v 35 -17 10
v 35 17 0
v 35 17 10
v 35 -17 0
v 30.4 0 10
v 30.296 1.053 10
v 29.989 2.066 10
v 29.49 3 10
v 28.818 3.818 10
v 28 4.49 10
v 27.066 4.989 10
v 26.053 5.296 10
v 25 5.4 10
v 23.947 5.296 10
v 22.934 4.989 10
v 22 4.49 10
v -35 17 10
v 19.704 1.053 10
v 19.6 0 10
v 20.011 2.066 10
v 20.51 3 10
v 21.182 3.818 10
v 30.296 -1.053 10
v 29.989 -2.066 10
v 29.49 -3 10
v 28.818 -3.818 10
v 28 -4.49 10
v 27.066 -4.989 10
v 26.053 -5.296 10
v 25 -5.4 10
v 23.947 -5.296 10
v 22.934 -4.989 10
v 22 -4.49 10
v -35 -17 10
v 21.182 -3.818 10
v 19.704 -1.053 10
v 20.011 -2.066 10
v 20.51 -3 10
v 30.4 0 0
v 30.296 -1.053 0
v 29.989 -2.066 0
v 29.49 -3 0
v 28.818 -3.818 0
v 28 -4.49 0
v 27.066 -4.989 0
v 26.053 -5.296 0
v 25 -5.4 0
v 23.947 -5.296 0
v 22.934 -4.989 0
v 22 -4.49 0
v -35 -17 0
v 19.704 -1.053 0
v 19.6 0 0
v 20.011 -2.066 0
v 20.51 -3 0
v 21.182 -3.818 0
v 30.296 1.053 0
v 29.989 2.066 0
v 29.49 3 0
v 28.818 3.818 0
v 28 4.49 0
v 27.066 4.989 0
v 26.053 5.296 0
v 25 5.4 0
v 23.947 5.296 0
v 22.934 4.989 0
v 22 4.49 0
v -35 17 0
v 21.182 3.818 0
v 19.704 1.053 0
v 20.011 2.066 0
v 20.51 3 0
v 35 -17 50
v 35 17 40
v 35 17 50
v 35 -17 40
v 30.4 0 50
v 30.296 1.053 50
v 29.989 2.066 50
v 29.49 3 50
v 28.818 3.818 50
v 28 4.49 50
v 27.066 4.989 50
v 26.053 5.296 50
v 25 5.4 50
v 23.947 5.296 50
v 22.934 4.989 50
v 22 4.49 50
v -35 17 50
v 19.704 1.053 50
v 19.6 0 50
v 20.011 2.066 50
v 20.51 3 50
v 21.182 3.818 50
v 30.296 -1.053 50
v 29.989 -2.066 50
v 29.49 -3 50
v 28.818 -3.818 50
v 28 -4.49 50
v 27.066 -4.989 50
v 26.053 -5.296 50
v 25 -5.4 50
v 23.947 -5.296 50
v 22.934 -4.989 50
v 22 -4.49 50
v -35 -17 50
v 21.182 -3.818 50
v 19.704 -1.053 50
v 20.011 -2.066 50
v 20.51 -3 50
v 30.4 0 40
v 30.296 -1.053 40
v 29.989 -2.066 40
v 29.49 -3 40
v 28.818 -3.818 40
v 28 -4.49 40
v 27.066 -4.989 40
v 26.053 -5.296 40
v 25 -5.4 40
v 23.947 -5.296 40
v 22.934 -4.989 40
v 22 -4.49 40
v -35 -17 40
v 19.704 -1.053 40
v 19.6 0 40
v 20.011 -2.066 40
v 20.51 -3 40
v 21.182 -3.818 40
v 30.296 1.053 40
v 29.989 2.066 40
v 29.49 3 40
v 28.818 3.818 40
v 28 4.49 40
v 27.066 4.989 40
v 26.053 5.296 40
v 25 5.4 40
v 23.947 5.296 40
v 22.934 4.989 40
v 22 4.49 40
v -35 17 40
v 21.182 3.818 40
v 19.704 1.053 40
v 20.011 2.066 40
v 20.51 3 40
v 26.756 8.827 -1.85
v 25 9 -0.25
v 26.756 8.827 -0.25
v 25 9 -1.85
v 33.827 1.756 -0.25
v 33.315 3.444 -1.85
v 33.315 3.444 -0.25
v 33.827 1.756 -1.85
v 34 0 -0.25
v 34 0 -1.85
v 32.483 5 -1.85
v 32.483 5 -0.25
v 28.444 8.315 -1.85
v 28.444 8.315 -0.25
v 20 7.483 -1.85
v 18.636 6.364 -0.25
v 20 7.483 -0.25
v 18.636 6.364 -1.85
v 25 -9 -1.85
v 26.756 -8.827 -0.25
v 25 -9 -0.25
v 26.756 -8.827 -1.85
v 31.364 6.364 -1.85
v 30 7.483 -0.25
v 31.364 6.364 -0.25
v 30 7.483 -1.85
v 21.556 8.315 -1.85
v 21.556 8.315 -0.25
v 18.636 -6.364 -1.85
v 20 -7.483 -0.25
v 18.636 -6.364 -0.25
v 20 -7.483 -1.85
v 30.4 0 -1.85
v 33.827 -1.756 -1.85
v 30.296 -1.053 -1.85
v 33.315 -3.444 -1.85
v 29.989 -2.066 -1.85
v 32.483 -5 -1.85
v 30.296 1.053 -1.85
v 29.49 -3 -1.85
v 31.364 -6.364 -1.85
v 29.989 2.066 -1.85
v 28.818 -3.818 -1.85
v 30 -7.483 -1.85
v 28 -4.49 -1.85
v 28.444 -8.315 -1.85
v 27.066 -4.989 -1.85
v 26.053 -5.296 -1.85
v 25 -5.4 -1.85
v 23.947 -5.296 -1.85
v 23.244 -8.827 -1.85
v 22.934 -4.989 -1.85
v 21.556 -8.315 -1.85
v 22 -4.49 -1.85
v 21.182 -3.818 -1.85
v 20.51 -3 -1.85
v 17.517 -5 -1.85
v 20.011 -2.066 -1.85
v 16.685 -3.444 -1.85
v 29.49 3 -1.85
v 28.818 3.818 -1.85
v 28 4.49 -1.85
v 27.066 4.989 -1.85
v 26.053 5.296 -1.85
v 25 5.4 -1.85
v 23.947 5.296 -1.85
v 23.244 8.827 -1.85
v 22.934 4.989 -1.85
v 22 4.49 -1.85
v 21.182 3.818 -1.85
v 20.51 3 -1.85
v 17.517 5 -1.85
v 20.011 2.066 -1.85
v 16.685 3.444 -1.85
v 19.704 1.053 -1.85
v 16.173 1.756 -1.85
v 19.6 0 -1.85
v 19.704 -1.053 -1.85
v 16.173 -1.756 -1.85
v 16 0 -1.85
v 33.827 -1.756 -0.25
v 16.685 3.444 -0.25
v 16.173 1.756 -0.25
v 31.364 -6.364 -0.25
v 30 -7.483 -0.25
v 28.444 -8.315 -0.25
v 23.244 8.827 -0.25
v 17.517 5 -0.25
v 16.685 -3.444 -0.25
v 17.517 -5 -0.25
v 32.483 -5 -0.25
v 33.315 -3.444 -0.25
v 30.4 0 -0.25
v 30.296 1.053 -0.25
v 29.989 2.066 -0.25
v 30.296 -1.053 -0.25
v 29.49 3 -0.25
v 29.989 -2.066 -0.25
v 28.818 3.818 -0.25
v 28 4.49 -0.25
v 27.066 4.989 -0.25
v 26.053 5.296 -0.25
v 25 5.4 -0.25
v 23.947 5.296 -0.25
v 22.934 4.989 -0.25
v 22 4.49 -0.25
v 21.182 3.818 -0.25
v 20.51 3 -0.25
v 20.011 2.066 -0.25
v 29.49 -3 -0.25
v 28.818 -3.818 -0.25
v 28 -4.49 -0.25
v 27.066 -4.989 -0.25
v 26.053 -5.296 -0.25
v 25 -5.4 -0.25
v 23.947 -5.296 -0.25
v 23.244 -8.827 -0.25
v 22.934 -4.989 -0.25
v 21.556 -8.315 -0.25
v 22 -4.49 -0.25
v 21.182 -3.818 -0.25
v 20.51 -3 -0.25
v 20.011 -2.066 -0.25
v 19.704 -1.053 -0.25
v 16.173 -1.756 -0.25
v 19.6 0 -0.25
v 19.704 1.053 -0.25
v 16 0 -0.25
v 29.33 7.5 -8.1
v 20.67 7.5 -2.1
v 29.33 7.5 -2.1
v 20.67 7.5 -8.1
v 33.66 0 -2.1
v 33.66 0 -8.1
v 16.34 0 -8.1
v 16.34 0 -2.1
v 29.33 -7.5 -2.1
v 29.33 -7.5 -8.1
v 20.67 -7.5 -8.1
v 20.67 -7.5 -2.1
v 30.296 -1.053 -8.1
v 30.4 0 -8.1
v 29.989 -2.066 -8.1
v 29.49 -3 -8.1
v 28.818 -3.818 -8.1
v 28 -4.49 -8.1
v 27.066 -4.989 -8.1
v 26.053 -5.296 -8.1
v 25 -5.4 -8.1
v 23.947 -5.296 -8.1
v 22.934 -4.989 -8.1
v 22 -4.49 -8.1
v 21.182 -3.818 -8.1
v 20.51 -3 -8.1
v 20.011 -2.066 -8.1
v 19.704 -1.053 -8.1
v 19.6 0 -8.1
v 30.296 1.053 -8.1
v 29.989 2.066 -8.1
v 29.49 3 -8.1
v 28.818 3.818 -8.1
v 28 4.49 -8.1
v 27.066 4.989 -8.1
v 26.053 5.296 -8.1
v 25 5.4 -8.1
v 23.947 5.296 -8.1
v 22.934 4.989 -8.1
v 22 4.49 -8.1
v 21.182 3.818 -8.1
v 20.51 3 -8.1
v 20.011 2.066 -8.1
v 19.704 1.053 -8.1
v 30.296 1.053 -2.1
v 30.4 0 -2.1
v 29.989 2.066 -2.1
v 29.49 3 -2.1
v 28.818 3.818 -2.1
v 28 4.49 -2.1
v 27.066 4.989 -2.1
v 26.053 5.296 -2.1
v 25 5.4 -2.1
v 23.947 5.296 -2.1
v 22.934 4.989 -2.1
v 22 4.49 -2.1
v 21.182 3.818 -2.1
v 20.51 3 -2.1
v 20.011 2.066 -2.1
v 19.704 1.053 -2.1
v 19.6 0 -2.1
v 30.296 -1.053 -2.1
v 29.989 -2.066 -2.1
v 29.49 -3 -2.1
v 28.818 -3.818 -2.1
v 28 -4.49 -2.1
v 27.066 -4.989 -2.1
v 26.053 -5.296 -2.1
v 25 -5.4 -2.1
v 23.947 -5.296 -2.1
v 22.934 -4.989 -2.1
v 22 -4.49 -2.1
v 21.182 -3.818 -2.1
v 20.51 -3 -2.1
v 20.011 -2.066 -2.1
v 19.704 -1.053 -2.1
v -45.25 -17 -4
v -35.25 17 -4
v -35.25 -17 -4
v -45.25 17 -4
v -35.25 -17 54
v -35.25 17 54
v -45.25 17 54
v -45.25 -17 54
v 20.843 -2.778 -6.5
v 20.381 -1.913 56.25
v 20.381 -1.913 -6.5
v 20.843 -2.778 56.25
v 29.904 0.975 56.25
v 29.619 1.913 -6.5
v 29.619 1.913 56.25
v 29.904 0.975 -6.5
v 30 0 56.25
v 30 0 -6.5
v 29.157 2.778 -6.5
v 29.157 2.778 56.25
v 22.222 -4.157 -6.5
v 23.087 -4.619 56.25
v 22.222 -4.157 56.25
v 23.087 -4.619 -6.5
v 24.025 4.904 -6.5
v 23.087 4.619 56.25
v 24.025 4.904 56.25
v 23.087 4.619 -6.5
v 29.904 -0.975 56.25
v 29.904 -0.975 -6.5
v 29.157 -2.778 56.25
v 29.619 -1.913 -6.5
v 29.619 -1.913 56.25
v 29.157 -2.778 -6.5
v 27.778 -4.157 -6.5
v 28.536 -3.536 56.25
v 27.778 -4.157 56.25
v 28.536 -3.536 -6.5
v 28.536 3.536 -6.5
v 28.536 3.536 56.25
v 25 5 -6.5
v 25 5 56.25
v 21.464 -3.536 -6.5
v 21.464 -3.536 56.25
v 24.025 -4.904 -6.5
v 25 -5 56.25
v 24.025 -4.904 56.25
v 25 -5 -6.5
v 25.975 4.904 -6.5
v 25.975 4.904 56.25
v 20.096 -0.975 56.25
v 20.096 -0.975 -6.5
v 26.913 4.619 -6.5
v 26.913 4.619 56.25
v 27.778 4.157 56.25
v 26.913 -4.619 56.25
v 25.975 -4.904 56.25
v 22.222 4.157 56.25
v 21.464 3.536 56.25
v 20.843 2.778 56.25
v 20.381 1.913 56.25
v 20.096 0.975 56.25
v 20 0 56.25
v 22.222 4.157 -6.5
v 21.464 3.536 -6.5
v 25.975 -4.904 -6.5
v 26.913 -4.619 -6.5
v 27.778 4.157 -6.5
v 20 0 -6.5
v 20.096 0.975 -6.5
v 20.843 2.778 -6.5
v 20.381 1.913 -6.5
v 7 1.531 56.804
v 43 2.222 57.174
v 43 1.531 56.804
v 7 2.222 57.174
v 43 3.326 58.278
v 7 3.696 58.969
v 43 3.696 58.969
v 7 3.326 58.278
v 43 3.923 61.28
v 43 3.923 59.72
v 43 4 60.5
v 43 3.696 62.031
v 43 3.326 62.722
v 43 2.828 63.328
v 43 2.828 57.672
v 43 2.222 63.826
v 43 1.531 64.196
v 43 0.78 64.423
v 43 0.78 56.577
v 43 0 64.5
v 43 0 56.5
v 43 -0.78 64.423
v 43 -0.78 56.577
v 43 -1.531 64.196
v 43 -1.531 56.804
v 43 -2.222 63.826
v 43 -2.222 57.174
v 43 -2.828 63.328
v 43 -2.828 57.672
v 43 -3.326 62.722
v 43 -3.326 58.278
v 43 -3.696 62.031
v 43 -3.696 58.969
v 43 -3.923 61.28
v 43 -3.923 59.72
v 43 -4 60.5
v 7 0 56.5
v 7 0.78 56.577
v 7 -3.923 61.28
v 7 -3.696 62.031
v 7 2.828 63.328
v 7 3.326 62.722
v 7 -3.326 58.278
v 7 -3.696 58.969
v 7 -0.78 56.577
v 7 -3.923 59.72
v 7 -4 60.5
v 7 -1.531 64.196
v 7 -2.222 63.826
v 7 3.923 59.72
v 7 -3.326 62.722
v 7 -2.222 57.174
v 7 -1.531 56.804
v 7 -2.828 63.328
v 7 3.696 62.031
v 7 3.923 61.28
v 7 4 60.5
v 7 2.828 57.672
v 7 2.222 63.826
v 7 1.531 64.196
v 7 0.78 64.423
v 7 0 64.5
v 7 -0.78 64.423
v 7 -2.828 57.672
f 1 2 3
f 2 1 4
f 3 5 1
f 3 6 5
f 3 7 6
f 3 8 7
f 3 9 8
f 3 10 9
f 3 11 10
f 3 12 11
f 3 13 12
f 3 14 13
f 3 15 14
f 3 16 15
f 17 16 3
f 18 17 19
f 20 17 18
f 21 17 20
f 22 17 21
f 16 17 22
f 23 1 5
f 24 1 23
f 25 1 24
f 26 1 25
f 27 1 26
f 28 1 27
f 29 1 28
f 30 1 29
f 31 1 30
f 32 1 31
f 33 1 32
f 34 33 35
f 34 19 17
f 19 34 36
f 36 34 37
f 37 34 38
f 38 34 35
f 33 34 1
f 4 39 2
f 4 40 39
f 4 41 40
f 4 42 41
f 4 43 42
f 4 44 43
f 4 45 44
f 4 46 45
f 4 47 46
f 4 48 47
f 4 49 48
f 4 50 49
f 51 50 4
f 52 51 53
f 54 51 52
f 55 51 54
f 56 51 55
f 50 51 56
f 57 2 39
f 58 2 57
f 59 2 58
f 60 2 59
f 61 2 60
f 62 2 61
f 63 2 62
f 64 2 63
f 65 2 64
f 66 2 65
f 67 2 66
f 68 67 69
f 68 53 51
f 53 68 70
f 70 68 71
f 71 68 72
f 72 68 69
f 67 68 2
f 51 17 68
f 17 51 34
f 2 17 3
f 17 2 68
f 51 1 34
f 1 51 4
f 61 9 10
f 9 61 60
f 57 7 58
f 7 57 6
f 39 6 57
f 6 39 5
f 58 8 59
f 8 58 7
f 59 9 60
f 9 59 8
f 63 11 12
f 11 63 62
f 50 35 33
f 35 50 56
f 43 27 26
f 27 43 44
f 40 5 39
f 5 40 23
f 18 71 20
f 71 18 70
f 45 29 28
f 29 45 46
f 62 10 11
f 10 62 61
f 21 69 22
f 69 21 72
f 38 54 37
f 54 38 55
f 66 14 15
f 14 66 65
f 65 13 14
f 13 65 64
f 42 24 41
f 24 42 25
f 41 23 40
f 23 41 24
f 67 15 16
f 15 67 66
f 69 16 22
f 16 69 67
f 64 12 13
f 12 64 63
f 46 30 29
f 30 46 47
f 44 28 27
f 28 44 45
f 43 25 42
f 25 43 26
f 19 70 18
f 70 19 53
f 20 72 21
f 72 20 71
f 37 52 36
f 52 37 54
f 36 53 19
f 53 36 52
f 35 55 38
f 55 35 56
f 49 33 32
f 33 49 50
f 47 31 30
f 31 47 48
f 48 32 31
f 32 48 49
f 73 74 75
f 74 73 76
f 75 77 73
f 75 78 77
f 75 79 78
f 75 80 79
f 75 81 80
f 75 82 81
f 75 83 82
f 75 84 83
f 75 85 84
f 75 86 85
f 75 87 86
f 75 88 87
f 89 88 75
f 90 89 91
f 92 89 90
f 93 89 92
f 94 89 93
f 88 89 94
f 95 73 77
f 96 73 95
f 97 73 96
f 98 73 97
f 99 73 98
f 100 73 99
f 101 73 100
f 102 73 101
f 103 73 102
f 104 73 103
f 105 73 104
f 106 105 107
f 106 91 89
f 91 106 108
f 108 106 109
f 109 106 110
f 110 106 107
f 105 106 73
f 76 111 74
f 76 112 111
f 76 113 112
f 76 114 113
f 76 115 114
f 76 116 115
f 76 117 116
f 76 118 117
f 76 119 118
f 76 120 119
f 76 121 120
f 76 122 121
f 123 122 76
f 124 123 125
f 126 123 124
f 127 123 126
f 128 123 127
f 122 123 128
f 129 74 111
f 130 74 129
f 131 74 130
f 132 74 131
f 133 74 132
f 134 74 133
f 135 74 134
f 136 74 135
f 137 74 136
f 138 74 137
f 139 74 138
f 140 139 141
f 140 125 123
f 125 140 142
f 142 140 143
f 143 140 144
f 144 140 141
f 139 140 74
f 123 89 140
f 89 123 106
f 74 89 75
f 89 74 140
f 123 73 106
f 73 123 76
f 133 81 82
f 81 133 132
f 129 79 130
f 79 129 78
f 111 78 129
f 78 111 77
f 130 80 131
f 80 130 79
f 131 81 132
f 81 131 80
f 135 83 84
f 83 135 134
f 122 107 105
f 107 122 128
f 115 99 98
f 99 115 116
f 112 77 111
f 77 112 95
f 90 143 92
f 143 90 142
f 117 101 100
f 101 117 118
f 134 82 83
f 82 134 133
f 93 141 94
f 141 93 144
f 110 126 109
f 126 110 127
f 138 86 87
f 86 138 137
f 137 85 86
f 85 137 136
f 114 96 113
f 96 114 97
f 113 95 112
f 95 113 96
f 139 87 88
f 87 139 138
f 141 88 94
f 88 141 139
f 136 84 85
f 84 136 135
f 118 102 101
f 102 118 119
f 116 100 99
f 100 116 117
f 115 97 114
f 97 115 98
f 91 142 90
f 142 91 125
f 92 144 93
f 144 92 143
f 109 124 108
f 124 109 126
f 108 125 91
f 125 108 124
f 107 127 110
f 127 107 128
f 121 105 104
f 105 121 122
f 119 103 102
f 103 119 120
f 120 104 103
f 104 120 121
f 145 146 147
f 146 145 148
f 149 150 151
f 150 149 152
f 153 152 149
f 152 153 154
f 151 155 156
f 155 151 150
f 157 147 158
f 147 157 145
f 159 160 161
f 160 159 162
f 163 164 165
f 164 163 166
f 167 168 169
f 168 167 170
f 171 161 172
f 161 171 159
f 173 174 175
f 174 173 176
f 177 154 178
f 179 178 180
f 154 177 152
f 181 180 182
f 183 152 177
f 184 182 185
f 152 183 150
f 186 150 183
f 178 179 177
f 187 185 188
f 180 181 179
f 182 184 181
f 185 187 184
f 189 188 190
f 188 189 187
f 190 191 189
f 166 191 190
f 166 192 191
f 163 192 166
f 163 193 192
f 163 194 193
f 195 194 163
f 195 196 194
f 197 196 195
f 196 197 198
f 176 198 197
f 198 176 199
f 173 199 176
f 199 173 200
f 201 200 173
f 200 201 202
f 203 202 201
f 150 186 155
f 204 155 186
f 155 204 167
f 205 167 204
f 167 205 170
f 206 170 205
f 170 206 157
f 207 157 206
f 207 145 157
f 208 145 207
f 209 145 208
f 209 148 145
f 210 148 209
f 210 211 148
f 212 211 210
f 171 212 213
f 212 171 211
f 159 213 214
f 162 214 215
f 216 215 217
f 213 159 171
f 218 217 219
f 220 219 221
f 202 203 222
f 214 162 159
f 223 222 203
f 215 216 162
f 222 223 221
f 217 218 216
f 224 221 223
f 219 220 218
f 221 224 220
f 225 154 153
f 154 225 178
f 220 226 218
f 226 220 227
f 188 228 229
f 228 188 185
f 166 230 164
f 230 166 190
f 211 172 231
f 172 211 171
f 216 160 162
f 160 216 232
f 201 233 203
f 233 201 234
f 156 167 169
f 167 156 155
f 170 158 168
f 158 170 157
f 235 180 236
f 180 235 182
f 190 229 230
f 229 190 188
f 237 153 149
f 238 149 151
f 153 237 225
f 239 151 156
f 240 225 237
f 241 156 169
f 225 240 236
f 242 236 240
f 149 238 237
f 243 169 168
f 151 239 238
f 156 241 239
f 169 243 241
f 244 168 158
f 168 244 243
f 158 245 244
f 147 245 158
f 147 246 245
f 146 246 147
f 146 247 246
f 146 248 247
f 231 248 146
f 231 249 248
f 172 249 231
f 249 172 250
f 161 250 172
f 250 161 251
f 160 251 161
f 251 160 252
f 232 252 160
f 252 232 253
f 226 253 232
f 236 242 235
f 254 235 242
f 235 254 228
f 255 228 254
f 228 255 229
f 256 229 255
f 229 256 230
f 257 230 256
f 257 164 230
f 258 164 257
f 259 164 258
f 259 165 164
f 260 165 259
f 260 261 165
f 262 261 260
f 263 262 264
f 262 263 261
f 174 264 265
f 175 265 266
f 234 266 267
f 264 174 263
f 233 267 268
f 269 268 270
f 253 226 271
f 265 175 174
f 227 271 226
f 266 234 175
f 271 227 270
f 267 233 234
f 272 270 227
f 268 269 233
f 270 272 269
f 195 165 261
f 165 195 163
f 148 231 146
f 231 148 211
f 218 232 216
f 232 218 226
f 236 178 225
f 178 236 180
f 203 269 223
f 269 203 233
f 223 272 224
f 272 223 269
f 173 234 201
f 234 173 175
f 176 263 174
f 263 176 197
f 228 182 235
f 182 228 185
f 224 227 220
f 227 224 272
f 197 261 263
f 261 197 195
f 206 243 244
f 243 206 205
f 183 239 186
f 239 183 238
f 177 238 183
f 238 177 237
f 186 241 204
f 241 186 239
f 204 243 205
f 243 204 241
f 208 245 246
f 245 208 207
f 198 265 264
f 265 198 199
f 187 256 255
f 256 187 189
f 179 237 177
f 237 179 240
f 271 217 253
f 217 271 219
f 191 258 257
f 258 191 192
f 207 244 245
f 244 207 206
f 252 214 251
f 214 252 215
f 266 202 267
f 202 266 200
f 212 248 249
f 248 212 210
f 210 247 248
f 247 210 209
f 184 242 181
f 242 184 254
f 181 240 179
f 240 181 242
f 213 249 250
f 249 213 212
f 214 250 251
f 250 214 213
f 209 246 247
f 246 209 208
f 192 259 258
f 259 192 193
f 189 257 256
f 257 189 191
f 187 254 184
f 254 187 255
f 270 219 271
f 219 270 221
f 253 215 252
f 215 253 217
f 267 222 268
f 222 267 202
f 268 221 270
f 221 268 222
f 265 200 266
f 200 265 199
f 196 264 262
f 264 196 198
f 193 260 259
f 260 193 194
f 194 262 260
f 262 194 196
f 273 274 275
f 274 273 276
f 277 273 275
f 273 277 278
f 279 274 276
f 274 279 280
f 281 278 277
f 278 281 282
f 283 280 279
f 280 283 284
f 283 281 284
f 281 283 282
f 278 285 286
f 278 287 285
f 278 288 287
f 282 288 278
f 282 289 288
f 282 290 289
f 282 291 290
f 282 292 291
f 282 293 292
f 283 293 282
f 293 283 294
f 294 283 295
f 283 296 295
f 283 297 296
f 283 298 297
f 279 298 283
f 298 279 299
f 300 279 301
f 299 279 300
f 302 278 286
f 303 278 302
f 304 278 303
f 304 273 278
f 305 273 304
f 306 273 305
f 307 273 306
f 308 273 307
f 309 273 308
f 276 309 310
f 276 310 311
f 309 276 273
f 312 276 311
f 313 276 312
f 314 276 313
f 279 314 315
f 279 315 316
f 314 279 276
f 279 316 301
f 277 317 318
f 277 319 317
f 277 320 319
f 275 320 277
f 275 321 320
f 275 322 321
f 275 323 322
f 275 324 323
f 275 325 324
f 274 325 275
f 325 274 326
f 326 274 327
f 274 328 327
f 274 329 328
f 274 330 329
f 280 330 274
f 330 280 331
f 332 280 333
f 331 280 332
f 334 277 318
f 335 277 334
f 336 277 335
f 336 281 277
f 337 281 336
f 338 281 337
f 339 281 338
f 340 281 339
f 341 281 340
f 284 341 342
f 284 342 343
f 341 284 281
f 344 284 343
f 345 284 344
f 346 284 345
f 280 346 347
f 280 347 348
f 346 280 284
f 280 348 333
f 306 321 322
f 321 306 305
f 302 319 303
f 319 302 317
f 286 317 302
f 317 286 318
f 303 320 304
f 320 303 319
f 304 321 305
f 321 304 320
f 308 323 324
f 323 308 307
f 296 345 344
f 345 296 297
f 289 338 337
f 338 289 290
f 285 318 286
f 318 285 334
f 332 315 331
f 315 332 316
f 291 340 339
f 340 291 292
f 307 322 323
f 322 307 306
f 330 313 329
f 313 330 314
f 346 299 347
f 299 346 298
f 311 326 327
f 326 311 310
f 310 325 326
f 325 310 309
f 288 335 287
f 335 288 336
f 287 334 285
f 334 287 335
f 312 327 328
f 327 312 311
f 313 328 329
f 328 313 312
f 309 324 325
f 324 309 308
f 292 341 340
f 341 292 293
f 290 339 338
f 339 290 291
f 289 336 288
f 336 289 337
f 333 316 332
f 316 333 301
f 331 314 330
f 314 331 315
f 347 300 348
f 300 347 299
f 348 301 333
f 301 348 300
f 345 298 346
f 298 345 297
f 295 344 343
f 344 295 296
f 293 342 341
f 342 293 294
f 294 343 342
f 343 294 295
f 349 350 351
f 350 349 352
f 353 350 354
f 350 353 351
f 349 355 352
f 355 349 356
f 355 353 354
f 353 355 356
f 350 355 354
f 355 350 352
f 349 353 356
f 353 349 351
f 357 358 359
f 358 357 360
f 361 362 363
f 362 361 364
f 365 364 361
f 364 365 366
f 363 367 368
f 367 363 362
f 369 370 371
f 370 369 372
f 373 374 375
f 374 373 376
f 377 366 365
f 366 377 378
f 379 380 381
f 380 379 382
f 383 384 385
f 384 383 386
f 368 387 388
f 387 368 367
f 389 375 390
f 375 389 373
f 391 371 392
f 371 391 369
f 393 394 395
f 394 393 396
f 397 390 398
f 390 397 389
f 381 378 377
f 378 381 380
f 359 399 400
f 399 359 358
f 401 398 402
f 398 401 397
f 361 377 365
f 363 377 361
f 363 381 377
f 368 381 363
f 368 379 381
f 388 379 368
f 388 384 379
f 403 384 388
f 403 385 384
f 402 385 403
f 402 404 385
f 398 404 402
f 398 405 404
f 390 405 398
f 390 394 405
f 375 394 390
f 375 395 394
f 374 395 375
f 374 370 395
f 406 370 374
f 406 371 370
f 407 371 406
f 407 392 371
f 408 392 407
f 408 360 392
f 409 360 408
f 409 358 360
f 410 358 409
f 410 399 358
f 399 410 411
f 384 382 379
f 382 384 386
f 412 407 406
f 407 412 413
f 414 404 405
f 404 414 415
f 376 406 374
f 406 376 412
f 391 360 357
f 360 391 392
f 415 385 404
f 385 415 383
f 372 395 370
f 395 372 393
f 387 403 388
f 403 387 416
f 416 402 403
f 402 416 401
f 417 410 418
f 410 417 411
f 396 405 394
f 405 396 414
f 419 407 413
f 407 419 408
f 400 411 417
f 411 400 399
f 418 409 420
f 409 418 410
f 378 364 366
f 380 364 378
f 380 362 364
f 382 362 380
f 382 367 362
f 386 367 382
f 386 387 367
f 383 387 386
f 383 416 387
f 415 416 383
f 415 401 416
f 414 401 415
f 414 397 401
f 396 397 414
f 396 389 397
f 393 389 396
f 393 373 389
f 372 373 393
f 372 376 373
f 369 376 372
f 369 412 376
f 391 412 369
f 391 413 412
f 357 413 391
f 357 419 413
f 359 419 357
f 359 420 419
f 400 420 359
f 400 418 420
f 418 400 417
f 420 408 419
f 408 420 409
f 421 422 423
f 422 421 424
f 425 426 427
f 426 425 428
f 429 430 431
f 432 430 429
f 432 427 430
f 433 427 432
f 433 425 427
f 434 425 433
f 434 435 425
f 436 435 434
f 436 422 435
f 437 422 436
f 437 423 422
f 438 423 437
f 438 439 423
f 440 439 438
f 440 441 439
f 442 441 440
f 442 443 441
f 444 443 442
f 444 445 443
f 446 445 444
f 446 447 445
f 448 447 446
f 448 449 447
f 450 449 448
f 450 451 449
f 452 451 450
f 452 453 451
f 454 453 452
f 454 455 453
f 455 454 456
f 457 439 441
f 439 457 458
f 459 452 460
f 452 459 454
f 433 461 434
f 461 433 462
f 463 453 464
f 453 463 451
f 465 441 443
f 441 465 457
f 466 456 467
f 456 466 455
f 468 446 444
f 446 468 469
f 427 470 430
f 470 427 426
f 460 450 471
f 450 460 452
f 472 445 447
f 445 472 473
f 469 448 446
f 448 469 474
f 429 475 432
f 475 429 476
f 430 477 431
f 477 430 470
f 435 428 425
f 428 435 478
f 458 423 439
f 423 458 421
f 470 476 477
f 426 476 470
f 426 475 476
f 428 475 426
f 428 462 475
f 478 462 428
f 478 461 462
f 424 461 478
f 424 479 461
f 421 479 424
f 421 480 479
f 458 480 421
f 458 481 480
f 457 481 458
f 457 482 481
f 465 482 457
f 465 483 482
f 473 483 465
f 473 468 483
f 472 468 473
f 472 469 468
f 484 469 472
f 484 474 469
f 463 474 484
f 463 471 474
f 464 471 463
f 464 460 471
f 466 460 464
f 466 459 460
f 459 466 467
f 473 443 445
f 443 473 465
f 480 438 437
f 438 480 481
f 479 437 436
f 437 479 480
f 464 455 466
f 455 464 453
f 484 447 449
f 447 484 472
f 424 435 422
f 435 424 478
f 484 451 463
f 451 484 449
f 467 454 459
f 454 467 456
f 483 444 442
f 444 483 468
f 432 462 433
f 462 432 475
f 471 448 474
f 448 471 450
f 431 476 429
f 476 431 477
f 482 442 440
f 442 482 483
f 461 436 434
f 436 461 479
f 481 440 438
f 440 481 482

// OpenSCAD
$fn = 32;

// ------------------------------------------------------------------------
// C clamp: throat 40 mm, screw d10
// Every part is its own module, assembly() places every instance.
// ------------------------------------------------------------------------

// --- part 1 ---
module clamp_arm() {
  difference() {
    translate([-35, -17, 0]) cube([70, 34, 10]);
    translate([25, 0, -1]) cylinder(h = 12, d = 10.8);
  }
}

// --- part 2 ---
module clamp_spine() {
  difference() {
    translate([-29, -17, 0]) cube([58, 34, 10]);
  }
}

// --- part 3 ---
module clamp_screw() {
  translate([0, 0, -31.375]) cylinder(h = 62.75, d = 10);
}

// --- part 4 ---
module clamp_washer() {
  difference() {
      translate([0, 0, 0]) cylinder(h = 1.6, d = 18);
      translate([0, 0, -1]) cylinder(h = 3.6, d = 10.8);
    }
}

// --- part 5 ---
module clamp_nut() {
  difference() {
    linear_extrude(height = 6) polygon(points = [[8.66, 0], [4.33, 7.5], [-4.33, 7.5], [-8.66, 0], [-4.33, -7.5], [4.33, -7.5]]);
    translate([0, 0, -1]) cylinder(h = 8, d = 10.8);
  }
}

// --- part 6 ---
module tommy_bar() {
  translate([0, 0, -18]) cylinder(h = 36, d = 8);
}

// --- assembly ---
module assembly() {
  color([0.80, 0.24, 0.20]) translate([0, 0, 0]) rotate([0, 0, 0]) clamp_arm();
  color([0.20, 0.45, 0.75]) translate([0, 0, 40]) rotate([0, 0, 0]) clamp_arm();
  color([0.25, 0.62, 0.32]) translate([-45.25, 0, 25]) rotate([0, 90, 0]) clamp_spine();
  color([0.92, 0.70, 0.18]) translate([25, 0, 24.875]) rotate([0, 0, 0]) clamp_screw();
  color([0.58, 0.35, 0.70]) translate([25, 0, -1.85]) rotate([0, 0, 0]) clamp_washer();
  color([0.16, 0.66, 0.66]) translate([25, 0, -8.1]) rotate([0, 0, 0]) clamp_nut();
  color([0.85, 0.48, 0.18]) translate([25, 0, 60.5]) rotate([0, 90, 0]) tommy_bar();
}

assembly();
